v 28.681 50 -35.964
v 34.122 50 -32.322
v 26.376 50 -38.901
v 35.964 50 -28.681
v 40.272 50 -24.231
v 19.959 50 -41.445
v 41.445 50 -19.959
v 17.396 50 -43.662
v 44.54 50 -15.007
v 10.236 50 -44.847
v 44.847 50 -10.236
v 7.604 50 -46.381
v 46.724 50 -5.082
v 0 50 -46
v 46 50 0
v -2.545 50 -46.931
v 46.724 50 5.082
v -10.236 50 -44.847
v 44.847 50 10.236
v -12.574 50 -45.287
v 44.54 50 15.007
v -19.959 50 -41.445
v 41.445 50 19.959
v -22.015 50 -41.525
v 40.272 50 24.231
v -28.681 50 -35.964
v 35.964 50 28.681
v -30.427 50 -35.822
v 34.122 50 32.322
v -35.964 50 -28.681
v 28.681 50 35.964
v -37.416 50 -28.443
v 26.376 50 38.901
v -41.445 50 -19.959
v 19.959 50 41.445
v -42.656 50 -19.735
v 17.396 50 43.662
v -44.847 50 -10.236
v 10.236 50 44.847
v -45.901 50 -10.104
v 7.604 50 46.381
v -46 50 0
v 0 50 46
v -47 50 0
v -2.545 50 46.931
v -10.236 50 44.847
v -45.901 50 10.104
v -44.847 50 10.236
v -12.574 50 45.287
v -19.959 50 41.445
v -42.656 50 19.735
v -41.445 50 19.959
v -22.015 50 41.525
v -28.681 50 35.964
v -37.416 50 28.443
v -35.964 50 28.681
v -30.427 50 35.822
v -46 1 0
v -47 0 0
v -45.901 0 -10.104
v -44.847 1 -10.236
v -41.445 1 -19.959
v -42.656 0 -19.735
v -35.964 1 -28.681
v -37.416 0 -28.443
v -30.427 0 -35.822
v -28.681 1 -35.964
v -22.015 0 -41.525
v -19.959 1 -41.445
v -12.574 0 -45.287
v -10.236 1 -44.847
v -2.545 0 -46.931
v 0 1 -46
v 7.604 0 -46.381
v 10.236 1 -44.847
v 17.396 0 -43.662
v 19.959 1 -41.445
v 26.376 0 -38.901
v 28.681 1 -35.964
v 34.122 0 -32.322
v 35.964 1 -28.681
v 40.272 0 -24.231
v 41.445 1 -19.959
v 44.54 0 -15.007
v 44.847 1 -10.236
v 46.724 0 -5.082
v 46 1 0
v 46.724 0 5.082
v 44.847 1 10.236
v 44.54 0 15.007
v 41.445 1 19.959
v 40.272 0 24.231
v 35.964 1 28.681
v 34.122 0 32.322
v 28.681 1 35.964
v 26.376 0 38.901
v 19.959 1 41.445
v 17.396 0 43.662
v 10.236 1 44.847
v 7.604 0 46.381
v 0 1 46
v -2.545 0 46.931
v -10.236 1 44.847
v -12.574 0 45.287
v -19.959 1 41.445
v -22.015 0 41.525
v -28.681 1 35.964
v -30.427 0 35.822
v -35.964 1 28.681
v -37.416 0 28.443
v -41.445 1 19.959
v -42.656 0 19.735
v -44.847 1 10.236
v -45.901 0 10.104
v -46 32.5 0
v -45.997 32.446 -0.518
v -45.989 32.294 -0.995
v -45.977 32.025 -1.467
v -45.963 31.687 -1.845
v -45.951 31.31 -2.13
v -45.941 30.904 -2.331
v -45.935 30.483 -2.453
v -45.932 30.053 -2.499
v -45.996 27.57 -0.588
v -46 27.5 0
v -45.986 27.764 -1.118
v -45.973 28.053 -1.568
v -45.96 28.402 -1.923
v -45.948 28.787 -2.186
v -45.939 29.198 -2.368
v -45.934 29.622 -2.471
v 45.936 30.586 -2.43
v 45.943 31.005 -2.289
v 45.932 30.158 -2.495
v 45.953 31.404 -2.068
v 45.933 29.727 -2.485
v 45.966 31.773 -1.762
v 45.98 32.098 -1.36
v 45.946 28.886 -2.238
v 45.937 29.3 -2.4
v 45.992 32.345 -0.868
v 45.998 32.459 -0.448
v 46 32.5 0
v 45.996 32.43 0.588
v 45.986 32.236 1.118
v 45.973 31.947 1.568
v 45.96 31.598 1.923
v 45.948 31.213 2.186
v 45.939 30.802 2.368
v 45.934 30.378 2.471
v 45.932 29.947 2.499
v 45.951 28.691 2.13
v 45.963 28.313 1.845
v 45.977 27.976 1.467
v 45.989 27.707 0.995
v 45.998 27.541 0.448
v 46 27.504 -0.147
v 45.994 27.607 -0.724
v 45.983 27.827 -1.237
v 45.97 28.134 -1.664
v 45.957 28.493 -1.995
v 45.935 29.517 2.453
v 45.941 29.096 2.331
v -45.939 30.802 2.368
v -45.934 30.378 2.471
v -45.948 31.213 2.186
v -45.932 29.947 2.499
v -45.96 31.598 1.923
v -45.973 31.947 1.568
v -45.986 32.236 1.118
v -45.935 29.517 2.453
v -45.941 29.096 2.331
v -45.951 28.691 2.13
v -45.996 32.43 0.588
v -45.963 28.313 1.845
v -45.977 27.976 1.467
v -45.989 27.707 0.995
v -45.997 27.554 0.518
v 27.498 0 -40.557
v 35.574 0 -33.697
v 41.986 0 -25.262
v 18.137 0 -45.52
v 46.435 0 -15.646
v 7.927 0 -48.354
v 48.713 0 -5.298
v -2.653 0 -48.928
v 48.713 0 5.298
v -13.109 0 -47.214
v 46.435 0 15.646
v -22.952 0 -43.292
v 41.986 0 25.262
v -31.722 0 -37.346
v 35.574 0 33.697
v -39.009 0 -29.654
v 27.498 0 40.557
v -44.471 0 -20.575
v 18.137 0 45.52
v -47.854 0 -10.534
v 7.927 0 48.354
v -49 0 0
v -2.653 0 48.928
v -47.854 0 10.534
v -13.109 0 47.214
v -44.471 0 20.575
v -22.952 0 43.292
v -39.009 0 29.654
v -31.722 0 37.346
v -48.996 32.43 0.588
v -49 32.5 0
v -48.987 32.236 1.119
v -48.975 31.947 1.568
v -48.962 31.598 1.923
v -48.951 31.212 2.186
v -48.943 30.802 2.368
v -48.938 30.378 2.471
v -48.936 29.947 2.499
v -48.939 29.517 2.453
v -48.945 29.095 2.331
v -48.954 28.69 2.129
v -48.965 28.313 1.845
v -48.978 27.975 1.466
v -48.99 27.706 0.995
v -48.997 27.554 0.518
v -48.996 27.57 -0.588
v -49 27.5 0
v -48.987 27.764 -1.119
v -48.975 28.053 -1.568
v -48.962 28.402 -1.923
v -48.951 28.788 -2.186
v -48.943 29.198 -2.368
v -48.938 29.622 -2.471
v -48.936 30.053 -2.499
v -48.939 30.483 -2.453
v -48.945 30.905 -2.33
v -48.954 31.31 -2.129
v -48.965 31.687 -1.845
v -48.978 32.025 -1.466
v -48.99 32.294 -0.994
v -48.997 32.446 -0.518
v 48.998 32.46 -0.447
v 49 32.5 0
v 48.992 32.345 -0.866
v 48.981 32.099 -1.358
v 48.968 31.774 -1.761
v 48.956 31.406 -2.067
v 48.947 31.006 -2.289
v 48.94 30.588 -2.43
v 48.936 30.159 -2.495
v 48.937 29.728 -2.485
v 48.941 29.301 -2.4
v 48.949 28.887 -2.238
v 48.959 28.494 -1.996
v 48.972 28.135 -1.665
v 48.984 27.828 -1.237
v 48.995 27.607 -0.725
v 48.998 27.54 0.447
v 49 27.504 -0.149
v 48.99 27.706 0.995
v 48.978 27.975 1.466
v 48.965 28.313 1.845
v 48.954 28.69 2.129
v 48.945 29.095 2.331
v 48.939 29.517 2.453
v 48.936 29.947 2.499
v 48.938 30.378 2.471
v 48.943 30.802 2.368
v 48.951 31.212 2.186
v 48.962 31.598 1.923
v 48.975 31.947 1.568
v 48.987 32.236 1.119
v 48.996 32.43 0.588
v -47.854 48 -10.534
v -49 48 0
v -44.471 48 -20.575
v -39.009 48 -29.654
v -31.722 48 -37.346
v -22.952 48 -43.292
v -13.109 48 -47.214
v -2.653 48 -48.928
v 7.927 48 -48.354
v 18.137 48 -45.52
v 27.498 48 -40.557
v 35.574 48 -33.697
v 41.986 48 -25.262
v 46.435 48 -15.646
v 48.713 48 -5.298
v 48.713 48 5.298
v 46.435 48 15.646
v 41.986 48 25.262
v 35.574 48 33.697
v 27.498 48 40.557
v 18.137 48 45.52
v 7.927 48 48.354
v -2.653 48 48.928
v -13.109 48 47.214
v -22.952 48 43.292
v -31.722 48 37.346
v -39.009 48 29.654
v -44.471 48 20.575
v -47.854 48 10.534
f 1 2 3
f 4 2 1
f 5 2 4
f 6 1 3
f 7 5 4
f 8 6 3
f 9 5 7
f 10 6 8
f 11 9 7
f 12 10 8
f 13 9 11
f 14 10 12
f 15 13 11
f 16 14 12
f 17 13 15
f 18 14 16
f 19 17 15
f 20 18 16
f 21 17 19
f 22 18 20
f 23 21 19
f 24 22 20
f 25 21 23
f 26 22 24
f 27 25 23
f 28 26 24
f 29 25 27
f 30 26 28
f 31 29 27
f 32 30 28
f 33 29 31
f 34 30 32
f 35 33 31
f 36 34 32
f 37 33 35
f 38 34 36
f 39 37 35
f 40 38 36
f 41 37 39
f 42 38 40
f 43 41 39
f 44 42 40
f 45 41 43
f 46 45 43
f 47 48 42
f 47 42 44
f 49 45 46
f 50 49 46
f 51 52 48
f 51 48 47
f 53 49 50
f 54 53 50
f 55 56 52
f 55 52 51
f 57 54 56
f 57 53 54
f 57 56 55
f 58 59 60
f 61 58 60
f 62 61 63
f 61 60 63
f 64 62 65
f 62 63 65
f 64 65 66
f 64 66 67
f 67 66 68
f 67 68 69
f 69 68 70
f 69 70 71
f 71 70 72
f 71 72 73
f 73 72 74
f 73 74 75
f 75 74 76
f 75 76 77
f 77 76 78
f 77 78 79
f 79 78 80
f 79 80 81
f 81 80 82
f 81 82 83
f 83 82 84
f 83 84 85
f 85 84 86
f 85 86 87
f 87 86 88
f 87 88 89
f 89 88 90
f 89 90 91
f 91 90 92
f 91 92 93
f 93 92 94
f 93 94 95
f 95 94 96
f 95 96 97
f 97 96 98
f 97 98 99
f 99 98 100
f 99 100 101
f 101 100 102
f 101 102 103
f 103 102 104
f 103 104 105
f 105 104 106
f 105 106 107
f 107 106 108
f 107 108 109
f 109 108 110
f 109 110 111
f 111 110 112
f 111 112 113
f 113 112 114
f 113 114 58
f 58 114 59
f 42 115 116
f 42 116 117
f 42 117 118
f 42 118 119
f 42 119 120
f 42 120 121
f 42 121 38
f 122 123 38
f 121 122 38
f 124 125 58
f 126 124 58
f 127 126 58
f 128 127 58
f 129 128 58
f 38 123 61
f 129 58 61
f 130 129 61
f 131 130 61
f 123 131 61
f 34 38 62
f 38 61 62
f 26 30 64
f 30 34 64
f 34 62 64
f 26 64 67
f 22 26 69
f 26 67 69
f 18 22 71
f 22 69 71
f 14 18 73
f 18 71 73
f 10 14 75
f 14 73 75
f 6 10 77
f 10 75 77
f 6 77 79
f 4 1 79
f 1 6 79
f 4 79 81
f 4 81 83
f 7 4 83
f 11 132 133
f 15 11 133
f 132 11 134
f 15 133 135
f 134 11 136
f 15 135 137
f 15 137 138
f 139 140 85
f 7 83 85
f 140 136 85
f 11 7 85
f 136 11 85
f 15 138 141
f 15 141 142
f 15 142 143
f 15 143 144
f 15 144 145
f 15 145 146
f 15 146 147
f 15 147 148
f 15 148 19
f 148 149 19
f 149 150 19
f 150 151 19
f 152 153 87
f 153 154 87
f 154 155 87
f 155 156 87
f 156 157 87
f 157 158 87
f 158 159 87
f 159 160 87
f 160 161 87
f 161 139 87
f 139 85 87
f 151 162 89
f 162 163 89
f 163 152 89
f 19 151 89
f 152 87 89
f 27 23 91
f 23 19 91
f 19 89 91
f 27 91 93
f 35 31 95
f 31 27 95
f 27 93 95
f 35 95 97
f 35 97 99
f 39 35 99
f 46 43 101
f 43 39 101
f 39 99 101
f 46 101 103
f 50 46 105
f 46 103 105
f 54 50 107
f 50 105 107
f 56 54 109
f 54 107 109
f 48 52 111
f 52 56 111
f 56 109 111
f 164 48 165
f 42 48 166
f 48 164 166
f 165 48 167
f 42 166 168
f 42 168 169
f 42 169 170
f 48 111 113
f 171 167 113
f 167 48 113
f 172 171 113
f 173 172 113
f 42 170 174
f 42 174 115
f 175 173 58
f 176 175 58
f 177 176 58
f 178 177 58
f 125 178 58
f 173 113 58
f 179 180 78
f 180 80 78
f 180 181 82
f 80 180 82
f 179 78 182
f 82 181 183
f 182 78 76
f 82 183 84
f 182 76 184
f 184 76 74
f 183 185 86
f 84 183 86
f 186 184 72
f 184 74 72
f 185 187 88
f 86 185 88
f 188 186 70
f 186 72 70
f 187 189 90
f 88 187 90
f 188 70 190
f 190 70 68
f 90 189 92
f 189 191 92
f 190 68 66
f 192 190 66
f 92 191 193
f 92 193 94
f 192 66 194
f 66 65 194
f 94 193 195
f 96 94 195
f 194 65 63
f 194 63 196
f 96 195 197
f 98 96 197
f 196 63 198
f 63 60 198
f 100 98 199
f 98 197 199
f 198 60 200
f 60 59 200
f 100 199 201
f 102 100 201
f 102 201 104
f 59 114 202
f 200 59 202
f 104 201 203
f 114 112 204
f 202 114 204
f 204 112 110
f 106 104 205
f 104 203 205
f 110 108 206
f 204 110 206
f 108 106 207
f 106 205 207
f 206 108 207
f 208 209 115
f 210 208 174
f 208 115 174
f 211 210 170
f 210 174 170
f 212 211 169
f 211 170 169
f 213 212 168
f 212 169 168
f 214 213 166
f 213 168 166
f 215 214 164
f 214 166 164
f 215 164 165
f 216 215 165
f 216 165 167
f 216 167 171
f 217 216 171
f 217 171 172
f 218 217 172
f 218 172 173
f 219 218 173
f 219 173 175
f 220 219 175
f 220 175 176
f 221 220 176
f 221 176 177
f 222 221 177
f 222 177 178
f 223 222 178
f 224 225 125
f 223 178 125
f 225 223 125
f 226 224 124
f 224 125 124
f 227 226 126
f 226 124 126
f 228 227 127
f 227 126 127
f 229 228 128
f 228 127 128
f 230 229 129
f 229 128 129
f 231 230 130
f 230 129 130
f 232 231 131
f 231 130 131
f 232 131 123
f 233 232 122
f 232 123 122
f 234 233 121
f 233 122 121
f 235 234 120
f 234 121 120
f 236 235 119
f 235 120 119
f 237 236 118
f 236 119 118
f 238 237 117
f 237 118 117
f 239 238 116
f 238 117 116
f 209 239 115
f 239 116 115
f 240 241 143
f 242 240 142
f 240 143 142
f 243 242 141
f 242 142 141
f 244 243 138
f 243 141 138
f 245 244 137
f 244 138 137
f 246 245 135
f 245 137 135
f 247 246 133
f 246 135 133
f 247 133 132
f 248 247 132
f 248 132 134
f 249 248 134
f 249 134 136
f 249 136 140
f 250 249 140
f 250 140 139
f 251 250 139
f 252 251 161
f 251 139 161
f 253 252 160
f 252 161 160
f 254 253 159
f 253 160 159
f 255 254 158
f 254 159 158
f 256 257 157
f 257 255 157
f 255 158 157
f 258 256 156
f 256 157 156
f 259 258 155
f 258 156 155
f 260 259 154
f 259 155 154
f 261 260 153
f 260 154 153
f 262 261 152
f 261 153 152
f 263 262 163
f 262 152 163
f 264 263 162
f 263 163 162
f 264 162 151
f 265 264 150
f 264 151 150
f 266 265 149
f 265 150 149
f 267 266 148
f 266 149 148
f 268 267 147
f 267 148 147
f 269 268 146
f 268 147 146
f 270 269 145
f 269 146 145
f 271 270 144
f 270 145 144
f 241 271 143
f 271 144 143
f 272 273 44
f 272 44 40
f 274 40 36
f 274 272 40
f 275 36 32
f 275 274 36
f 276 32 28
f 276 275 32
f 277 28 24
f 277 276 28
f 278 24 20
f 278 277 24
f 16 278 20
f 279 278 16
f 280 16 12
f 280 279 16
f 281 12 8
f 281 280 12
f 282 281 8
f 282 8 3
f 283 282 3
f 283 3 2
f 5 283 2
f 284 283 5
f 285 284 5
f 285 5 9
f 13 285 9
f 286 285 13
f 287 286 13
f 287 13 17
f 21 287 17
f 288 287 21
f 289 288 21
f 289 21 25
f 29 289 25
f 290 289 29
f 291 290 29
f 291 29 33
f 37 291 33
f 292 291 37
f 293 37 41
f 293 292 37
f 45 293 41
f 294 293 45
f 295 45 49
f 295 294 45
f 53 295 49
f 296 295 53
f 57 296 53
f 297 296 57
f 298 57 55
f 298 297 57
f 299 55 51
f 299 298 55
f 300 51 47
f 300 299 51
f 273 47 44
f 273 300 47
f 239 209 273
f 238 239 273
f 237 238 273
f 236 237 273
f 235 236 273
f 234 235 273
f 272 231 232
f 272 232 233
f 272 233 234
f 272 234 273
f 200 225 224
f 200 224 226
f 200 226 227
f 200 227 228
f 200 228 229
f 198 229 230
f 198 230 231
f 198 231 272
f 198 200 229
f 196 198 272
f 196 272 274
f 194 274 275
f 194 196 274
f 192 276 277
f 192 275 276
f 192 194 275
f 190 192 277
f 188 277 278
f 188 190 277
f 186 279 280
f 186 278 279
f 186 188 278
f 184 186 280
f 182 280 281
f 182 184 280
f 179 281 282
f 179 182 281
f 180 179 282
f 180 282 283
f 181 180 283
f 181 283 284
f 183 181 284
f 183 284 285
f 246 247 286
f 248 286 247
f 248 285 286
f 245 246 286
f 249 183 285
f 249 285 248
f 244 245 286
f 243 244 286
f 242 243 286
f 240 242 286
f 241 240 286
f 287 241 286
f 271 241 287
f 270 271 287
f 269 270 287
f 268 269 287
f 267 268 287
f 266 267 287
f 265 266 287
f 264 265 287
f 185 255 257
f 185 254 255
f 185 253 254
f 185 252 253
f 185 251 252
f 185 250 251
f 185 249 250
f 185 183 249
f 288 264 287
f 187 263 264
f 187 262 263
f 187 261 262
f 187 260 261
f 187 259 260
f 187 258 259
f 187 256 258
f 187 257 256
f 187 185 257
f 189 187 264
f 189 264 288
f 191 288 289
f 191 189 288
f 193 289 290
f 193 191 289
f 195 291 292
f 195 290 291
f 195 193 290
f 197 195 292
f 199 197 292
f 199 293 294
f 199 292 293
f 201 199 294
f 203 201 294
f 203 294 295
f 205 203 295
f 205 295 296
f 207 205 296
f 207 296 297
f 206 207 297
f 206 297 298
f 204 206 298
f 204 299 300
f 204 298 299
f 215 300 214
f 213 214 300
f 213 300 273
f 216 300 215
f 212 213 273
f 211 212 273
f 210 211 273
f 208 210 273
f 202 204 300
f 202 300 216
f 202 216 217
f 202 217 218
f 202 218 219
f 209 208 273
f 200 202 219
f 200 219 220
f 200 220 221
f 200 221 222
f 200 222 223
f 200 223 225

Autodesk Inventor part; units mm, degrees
ref_plane "YZ Plane" through (0, 0, 0) normal (1, 0, 0) x (0, 1, 0)
ref_plane "XZ Plane" through (0, 0, 0) normal (0, 1, 0) x (-1, 0, 0)
ref_plane "XY Plane" through (0, 0, 0) normal (0, 0, 1) x (1, 0, 0)
sketch "Sketch1" plane through (0, 0, 0) normal (0, 1, 0) x (-1, 0, 0)
  circle A0 centre (0, 0) radius 46
  circle A1 centre (0, 0) radius 49
  dimension "d0" = 92
  dimension "d1" = 98
extrude "Extrusion1" add sketch "Sketch1" along normal blind 50
chamfer "Chamfer1" distance 2 angle 45 1 edges at (49, 50, 0)
chamfer "Chamfer2" distance 1 angle 45 1 edges at (46, 0, 0)
sketch "Sketch2" plane through (0, 0, 0) normal (1, 0, 0) x (0, 1, 0)
  circle A0 centre (30, 0) radius 2.5
  line L0 (50, 46) -> (50, -46) projected
  point P0 (0, 0)
  dimension "d10" = 5
  dimension "d11" = 20
extrude "Extrusion2" cut sketch "Sketch2" along normal through all both and the other way through all
properties part number "HubSparHole90"
